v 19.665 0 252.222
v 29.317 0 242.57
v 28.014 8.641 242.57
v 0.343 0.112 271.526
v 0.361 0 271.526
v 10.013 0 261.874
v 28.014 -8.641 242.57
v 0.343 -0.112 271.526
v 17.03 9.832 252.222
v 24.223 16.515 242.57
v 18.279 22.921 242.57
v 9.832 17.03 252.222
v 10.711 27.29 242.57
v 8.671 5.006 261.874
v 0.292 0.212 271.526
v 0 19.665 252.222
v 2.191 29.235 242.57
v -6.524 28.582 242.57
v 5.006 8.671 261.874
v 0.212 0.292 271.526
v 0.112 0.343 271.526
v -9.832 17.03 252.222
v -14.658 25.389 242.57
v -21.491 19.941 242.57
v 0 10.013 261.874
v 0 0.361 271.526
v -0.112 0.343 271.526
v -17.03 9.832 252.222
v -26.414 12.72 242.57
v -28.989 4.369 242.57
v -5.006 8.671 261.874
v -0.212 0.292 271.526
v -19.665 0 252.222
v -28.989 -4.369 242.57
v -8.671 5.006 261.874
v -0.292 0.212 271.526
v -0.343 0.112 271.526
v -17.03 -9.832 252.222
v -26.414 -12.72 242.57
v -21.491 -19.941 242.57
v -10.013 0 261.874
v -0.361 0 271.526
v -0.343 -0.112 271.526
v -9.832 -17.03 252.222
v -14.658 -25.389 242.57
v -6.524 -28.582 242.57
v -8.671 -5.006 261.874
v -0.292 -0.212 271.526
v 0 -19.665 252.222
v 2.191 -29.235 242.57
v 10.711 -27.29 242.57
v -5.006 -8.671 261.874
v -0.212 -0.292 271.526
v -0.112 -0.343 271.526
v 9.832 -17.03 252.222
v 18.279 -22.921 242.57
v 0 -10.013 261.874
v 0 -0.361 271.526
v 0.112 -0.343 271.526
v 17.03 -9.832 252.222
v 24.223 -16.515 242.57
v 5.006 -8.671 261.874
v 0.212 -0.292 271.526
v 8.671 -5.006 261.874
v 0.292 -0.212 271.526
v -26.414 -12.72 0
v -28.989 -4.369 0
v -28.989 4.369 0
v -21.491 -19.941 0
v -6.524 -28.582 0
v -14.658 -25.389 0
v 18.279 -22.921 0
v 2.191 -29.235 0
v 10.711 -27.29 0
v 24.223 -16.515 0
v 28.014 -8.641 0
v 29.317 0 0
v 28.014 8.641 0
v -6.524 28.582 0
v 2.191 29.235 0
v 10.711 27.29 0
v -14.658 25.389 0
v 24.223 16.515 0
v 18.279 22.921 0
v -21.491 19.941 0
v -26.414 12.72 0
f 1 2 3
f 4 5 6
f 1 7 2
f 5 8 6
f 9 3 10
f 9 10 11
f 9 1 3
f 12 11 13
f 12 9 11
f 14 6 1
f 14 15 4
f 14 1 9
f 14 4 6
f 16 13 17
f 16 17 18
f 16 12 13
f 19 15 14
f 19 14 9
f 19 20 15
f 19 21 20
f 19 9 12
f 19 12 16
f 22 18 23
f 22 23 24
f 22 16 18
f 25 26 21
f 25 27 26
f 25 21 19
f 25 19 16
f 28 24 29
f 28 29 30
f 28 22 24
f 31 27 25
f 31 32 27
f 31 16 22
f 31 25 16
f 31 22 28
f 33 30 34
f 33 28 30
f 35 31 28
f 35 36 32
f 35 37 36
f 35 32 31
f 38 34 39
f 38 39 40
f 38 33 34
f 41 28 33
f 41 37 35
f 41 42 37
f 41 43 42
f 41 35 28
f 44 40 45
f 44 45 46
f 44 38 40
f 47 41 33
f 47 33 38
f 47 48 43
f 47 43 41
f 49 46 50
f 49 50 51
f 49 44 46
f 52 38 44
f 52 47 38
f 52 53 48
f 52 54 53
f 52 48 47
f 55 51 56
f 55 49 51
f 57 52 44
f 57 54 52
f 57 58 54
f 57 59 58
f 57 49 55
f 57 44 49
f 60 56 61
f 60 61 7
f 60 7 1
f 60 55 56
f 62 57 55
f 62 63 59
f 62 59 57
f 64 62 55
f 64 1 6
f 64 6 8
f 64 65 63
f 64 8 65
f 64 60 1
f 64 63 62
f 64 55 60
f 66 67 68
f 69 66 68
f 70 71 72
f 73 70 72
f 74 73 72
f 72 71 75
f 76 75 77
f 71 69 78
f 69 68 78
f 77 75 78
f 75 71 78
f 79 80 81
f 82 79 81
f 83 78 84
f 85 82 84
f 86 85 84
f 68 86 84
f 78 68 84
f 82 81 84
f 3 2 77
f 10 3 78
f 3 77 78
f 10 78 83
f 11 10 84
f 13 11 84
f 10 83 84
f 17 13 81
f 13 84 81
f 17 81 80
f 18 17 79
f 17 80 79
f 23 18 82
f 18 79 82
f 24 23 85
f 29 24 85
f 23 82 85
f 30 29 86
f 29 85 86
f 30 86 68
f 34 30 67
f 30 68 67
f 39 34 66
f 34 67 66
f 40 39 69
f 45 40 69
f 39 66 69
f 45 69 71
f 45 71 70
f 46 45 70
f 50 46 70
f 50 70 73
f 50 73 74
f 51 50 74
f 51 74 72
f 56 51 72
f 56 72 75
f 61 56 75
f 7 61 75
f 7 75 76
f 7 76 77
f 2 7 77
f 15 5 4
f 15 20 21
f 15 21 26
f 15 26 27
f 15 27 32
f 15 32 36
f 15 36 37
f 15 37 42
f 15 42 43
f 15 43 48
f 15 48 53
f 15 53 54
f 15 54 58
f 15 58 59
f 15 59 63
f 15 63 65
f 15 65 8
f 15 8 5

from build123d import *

# Parameters (mm, degrees)
F0_R     = 29.3168750736
F1_DEPTH = 68.326
F2_DEPTH = 203.2
F3_SIZE  = 28.956


with BuildPart() as f1:
    # F0 (on Top) → F1 (new body)
    with BuildSketch(Plane.XY):
        Circle(F0_R)
    extrude(amount=F1_DEPTH)

    # F2 (add): a face of the model
    f2_faces = [f1.faces().sort_by_distance(p)[0] for p in [
        (0, 0, 68.326),
    ]]
    extrude(f2_faces, amount=F2_DEPTH)

    # F3
    f3_edges = [f1.edges().sort_by_distance(p)[0] for p in [
        (-29.316875, 0, 271.526),
    ]]
    chamfer(f3_edges, length=F3_SIZE)


solid = f1.part
